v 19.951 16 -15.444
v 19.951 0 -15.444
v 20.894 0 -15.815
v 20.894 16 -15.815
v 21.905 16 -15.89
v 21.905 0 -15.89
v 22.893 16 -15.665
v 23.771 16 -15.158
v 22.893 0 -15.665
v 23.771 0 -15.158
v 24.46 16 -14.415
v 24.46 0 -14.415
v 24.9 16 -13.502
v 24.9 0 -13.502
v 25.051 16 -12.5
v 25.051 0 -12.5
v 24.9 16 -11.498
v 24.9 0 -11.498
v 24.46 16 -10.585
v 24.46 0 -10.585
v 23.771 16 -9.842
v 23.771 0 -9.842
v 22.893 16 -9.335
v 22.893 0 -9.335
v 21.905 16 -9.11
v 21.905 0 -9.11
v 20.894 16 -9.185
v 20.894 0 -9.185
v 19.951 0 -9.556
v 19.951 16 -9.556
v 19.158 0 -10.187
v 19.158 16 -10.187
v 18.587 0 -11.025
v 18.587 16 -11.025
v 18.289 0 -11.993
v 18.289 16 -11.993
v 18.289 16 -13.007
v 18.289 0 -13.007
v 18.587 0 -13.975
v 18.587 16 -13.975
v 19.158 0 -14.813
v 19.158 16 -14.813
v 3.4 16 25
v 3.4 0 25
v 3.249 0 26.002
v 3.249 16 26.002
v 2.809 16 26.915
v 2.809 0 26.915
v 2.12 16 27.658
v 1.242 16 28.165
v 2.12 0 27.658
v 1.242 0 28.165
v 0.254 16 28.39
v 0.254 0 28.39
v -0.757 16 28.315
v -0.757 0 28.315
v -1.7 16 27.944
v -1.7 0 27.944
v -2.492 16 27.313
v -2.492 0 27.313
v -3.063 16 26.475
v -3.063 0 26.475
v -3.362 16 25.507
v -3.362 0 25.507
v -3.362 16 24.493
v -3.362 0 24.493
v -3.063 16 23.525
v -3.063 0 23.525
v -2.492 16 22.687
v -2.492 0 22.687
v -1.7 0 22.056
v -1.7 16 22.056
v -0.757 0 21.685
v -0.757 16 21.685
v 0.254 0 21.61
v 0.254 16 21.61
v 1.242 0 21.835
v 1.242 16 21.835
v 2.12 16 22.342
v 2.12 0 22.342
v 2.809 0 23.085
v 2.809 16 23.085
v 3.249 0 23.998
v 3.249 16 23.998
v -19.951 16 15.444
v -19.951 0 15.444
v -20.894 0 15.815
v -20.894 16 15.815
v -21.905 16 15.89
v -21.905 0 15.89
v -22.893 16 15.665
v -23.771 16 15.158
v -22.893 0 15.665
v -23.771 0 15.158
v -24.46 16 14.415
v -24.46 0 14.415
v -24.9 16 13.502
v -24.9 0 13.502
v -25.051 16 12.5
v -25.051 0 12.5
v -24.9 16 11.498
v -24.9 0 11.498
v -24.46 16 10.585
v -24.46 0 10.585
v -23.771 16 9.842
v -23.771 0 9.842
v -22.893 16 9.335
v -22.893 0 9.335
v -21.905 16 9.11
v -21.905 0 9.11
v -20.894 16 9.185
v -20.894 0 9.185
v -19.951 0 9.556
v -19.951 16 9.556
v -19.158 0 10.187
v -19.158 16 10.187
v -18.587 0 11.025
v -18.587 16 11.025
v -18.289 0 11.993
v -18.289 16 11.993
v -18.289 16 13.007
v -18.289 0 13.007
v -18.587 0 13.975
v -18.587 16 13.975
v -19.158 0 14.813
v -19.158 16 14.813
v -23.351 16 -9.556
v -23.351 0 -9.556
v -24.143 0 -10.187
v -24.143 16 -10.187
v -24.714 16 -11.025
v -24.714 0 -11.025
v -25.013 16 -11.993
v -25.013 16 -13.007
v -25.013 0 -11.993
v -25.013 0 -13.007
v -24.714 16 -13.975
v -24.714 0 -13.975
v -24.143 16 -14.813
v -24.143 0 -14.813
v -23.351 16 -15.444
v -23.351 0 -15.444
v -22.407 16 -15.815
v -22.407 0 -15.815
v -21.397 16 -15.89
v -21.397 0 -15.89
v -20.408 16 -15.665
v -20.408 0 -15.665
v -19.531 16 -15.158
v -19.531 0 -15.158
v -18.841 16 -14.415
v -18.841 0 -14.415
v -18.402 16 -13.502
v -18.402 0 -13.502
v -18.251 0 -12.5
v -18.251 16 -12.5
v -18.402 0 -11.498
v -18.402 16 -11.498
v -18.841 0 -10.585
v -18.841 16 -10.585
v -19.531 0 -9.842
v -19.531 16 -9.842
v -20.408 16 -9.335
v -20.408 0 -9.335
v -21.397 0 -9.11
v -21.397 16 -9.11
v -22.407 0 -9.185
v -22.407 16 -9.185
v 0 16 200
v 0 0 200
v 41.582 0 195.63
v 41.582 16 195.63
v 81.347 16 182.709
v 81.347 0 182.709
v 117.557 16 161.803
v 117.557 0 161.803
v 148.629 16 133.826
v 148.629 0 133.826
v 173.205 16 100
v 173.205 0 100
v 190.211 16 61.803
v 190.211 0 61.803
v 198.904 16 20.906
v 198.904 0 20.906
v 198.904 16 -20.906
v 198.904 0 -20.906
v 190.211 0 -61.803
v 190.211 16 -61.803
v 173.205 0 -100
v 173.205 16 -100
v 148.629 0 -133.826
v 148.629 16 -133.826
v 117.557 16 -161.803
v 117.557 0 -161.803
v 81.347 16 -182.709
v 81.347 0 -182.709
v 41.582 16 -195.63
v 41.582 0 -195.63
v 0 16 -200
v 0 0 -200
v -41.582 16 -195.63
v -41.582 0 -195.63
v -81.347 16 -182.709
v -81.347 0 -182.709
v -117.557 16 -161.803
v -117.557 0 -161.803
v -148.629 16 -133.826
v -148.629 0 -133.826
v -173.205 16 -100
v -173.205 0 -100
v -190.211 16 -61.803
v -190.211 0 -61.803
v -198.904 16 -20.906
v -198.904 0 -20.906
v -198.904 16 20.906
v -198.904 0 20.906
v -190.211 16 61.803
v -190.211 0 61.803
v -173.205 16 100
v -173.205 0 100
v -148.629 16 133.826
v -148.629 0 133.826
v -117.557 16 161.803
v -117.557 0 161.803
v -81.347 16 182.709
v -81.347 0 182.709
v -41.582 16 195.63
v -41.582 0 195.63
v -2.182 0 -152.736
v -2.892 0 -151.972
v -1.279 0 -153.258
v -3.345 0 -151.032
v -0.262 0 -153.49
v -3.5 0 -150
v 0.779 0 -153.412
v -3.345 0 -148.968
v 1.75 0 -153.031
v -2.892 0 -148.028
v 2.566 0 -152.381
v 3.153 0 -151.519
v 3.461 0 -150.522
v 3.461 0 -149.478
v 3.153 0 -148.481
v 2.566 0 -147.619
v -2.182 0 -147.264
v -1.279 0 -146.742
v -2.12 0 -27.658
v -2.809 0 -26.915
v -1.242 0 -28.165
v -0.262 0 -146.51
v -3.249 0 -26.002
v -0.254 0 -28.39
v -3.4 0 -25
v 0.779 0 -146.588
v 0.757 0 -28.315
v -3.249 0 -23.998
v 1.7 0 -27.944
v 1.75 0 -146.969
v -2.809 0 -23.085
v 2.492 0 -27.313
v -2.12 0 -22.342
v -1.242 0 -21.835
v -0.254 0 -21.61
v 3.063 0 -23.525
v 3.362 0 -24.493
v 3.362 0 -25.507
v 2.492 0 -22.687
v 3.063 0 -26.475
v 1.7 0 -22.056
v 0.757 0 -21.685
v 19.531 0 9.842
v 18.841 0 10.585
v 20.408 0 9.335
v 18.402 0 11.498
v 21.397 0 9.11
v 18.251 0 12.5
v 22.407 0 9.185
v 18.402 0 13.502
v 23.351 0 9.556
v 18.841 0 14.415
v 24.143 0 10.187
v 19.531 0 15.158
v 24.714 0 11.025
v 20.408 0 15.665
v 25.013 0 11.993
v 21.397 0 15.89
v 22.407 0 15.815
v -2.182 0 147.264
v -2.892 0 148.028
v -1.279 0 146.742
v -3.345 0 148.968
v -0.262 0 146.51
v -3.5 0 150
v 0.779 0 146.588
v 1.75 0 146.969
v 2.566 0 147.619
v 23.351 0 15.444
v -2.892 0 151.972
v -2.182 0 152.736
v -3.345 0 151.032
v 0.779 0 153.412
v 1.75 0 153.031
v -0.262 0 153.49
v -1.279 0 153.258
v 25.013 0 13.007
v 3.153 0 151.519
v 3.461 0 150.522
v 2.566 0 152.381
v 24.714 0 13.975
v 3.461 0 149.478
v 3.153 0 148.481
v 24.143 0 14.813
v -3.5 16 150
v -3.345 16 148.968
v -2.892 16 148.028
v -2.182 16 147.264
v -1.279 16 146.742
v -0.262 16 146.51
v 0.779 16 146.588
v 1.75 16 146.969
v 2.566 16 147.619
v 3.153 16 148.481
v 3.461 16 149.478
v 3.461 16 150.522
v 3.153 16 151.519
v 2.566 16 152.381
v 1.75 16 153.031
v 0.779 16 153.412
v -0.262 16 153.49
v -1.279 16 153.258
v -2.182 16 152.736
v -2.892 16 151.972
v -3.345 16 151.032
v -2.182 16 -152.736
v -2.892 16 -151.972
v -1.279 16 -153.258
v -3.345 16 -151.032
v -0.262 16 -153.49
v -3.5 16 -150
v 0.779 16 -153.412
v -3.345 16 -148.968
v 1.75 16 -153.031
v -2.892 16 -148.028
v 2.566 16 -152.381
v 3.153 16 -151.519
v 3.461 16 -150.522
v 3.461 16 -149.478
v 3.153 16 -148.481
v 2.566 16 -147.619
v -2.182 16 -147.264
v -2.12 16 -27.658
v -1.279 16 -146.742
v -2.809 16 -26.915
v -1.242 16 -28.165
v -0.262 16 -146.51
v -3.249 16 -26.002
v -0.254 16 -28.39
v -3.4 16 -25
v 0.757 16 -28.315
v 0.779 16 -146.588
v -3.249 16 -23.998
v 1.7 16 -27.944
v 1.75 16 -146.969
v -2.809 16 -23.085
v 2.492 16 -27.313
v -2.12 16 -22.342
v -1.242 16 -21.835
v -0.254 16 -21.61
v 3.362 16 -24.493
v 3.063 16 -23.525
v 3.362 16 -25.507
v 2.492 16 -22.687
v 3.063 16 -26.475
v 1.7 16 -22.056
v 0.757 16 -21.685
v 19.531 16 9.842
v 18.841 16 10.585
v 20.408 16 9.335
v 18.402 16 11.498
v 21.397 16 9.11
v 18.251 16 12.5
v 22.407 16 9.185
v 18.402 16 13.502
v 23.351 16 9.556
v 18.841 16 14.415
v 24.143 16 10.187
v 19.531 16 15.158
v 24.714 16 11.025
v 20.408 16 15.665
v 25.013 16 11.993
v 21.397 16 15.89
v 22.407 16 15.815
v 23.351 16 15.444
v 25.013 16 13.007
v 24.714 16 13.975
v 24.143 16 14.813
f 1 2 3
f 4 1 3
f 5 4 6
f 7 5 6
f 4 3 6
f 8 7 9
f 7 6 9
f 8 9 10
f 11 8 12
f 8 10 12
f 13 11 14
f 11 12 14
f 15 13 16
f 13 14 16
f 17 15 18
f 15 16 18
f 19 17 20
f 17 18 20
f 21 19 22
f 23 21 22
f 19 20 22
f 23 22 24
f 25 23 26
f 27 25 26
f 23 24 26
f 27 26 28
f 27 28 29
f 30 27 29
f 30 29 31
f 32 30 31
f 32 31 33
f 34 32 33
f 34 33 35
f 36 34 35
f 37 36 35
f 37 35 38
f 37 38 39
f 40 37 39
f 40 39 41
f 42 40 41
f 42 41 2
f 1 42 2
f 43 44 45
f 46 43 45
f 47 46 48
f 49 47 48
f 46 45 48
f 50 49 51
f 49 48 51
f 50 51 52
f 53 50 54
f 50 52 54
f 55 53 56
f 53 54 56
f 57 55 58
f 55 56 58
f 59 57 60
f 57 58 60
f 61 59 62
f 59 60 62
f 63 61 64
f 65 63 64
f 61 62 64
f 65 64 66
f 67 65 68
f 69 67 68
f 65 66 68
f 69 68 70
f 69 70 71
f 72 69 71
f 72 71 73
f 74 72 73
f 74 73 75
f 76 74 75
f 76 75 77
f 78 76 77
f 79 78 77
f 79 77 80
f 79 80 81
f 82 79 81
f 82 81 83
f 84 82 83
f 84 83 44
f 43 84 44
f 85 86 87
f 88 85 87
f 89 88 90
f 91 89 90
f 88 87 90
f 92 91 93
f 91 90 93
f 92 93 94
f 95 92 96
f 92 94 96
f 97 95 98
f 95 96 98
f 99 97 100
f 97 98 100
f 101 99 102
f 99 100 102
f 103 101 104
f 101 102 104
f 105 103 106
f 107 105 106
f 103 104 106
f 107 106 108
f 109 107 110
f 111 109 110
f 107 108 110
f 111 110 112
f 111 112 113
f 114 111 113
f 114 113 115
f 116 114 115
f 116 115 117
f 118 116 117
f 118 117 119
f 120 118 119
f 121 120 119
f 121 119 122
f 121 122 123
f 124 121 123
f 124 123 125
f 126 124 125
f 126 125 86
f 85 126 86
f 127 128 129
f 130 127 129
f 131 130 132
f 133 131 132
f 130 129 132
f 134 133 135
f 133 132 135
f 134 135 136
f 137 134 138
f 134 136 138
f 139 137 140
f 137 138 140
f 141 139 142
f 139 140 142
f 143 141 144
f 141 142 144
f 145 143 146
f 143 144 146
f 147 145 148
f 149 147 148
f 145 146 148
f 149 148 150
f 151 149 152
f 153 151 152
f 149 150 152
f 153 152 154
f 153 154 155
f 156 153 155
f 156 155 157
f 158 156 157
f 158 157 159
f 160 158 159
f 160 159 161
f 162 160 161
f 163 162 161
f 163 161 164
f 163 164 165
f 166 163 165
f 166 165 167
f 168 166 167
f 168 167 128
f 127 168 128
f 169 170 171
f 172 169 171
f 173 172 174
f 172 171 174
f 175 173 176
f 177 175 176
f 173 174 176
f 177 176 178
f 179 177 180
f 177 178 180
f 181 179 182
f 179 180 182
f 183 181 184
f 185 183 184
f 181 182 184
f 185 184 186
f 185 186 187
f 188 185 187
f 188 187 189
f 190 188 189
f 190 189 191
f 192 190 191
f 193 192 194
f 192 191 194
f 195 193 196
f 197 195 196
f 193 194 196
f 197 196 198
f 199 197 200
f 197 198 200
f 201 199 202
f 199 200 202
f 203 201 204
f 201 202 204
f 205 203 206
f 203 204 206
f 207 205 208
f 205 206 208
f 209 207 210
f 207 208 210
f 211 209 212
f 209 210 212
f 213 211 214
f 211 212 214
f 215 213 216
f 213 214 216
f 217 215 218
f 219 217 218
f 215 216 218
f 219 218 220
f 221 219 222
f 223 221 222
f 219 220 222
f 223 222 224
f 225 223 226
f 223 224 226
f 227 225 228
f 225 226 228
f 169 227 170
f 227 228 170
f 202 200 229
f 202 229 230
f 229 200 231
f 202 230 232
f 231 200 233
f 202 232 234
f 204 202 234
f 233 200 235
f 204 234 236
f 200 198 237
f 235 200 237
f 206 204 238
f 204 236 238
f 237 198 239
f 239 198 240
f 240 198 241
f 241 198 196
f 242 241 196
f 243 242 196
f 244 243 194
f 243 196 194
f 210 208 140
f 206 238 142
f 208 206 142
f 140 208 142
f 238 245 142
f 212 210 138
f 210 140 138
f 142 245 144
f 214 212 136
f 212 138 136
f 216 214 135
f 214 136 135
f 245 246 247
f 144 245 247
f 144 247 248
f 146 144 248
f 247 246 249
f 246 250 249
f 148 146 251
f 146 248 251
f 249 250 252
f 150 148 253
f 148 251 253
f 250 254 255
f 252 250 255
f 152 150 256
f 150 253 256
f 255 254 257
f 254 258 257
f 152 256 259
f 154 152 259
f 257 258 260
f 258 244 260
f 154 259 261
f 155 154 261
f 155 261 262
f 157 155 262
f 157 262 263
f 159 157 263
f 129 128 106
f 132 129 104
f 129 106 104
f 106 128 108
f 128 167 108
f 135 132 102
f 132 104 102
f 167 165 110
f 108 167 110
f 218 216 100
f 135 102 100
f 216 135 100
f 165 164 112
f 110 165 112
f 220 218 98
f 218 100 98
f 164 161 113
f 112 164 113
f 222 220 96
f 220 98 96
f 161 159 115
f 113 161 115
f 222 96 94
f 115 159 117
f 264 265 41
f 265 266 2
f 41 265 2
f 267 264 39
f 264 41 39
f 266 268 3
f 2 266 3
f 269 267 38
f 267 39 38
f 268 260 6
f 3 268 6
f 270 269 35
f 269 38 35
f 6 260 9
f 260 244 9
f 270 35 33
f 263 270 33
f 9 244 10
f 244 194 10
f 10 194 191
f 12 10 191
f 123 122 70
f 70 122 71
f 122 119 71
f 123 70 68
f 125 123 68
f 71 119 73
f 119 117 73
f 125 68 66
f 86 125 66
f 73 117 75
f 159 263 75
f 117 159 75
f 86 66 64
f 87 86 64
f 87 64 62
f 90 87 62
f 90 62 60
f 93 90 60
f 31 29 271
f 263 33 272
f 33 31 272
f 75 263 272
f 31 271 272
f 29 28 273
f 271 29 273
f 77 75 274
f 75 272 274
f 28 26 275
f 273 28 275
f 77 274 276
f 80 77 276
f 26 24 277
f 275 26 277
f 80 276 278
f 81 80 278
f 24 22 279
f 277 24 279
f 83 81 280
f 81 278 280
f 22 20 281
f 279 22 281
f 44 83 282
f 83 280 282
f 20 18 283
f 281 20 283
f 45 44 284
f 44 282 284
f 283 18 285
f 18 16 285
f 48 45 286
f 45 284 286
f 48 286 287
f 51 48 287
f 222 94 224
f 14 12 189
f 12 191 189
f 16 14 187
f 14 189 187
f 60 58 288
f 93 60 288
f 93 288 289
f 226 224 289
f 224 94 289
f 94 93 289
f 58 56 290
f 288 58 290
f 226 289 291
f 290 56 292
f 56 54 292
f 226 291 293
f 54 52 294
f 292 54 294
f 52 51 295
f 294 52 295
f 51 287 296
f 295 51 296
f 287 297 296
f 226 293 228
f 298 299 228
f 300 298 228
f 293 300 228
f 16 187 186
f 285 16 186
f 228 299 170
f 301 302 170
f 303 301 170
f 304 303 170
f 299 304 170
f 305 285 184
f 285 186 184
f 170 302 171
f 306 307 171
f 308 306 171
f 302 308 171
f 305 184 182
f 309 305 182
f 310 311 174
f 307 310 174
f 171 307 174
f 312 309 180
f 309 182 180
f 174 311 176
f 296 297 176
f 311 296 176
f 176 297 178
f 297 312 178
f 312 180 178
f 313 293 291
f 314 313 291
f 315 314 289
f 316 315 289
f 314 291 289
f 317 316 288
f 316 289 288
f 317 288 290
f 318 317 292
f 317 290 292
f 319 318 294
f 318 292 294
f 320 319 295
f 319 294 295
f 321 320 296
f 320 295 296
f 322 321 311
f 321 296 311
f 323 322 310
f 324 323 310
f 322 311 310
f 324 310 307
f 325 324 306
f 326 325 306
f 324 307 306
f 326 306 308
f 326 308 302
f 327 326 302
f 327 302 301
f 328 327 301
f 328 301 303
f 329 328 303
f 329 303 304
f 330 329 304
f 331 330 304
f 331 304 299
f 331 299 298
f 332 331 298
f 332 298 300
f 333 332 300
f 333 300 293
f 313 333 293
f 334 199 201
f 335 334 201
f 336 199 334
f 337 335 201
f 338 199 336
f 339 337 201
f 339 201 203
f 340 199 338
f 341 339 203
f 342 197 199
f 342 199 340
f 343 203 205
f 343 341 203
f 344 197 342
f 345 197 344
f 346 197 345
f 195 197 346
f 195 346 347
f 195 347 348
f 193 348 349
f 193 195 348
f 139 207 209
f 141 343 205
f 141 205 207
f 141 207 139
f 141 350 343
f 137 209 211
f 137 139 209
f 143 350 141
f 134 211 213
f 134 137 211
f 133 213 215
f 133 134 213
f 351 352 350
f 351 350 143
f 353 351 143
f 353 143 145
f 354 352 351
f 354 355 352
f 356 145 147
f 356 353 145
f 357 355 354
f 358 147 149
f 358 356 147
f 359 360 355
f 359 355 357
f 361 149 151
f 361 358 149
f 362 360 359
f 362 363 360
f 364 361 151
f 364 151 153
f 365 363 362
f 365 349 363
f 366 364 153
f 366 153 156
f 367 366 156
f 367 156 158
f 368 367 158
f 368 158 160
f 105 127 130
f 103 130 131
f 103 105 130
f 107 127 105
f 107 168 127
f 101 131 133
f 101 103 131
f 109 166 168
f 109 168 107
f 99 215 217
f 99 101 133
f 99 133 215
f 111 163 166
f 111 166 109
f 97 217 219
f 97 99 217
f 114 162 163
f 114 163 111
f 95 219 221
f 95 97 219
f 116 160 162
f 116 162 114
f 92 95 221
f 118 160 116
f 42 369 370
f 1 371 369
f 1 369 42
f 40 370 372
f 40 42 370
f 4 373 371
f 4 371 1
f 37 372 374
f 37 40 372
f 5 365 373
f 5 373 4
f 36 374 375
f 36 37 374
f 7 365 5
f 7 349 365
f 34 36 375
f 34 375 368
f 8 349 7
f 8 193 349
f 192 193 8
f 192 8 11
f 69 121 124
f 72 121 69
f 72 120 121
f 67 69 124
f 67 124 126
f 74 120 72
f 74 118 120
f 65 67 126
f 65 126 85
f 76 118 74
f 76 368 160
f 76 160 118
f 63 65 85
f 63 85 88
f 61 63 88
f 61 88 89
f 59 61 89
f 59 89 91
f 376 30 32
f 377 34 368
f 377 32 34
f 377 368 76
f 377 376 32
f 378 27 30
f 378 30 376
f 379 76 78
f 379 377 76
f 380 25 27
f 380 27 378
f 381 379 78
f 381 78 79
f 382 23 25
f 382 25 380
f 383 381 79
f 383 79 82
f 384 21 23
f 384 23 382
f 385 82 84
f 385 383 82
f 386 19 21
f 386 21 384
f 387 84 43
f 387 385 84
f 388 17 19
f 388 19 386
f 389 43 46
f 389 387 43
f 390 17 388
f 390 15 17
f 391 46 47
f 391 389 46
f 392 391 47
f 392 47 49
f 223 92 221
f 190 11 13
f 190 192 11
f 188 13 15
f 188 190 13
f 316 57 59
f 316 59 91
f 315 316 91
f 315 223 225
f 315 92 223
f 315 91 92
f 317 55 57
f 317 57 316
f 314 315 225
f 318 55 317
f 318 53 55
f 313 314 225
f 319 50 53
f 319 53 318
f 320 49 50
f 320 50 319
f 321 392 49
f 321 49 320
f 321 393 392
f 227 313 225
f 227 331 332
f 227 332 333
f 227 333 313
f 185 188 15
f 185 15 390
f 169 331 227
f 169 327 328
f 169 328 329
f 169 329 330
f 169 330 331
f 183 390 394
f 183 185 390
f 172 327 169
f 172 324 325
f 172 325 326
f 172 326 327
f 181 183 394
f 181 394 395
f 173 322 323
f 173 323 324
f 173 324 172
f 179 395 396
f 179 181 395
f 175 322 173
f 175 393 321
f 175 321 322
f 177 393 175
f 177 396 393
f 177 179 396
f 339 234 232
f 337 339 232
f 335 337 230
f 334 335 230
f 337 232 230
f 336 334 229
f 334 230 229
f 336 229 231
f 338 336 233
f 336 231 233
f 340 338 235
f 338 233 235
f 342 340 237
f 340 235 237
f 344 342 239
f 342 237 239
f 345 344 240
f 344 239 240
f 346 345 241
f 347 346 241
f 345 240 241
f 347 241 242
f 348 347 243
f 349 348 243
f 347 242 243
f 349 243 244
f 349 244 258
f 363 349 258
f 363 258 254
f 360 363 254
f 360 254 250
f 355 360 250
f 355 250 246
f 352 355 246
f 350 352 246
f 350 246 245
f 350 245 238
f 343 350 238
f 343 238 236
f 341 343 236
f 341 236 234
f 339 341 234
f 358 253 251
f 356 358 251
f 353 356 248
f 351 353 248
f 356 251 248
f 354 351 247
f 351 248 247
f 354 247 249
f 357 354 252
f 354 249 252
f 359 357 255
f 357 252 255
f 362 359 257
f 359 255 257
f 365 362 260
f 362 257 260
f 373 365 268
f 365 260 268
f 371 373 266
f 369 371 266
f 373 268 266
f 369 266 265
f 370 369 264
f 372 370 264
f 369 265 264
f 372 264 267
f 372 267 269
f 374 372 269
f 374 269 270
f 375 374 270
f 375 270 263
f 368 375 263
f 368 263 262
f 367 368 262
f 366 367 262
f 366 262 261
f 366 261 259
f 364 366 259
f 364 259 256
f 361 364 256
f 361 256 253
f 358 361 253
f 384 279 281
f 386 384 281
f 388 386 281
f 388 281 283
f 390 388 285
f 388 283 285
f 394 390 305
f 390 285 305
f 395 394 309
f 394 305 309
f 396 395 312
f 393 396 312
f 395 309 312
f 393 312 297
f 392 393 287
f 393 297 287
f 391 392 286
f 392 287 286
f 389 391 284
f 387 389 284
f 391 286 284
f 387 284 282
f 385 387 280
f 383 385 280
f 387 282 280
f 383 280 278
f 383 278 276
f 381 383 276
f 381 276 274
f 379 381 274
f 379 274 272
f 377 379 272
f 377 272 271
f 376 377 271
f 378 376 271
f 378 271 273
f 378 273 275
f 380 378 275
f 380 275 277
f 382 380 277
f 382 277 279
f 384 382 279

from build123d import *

# Parameters (mm, degrees)
SKETCH1_R             = 200
BOSS_EXTRUDE1_DEPTH   = 16
M8_TAPPED_HOLE1_D     = 6.8
CIRPATTERN1_COUNT     = 6
M8X1_0_TAPPED_HOLE1_D = 7


with BuildPart() as part:
    # Sketch1 → Boss-Extrude1 (new body)
    with BuildSketch(Plane(origin=(0, 0, 0), x_dir=(1, 0, 0), z_dir=(0, 1, 0))):
        Circle(SKETCH1_R)
    extrude(amount=BOSS_EXTRUDE1_DEPTH)

    # M8 Tapped Hole1 (through all)
    with Locations(Plane(origin=(0, 16, 0), x_dir=(1, 0, 0), z_dir=(0, 1, 0))):
        with Locations((0, 25)):
            m8_tapped_hole1 = Hole(M8_TAPPED_HOLE1_D / 2)

    # CirPattern1: M8 Tapped Hole1 ×6 about axis
    cirpattern1_axis = Axis((0, -43.514912226, 0), (0, 1, 0))
    for i in range(1, CIRPATTERN1_COUNT):
        add(m8_tapped_hole1.rotate(cirpattern1_axis, i * 360 / CIRPATTERN1_COUNT), mode=Mode.SUBTRACT)

    # M8x1.0 Tapped Hole1 (through all)
    with Locations(Plane(origin=(0, 16, 0), x_dir=(1, 0, 0), z_dir=(0, 1, 0))):
        with Locations((0, 150), (0, -150)):
            Hole(M8X1_0_TAPPED_HOLE1_D / 2)


solid = part.part
